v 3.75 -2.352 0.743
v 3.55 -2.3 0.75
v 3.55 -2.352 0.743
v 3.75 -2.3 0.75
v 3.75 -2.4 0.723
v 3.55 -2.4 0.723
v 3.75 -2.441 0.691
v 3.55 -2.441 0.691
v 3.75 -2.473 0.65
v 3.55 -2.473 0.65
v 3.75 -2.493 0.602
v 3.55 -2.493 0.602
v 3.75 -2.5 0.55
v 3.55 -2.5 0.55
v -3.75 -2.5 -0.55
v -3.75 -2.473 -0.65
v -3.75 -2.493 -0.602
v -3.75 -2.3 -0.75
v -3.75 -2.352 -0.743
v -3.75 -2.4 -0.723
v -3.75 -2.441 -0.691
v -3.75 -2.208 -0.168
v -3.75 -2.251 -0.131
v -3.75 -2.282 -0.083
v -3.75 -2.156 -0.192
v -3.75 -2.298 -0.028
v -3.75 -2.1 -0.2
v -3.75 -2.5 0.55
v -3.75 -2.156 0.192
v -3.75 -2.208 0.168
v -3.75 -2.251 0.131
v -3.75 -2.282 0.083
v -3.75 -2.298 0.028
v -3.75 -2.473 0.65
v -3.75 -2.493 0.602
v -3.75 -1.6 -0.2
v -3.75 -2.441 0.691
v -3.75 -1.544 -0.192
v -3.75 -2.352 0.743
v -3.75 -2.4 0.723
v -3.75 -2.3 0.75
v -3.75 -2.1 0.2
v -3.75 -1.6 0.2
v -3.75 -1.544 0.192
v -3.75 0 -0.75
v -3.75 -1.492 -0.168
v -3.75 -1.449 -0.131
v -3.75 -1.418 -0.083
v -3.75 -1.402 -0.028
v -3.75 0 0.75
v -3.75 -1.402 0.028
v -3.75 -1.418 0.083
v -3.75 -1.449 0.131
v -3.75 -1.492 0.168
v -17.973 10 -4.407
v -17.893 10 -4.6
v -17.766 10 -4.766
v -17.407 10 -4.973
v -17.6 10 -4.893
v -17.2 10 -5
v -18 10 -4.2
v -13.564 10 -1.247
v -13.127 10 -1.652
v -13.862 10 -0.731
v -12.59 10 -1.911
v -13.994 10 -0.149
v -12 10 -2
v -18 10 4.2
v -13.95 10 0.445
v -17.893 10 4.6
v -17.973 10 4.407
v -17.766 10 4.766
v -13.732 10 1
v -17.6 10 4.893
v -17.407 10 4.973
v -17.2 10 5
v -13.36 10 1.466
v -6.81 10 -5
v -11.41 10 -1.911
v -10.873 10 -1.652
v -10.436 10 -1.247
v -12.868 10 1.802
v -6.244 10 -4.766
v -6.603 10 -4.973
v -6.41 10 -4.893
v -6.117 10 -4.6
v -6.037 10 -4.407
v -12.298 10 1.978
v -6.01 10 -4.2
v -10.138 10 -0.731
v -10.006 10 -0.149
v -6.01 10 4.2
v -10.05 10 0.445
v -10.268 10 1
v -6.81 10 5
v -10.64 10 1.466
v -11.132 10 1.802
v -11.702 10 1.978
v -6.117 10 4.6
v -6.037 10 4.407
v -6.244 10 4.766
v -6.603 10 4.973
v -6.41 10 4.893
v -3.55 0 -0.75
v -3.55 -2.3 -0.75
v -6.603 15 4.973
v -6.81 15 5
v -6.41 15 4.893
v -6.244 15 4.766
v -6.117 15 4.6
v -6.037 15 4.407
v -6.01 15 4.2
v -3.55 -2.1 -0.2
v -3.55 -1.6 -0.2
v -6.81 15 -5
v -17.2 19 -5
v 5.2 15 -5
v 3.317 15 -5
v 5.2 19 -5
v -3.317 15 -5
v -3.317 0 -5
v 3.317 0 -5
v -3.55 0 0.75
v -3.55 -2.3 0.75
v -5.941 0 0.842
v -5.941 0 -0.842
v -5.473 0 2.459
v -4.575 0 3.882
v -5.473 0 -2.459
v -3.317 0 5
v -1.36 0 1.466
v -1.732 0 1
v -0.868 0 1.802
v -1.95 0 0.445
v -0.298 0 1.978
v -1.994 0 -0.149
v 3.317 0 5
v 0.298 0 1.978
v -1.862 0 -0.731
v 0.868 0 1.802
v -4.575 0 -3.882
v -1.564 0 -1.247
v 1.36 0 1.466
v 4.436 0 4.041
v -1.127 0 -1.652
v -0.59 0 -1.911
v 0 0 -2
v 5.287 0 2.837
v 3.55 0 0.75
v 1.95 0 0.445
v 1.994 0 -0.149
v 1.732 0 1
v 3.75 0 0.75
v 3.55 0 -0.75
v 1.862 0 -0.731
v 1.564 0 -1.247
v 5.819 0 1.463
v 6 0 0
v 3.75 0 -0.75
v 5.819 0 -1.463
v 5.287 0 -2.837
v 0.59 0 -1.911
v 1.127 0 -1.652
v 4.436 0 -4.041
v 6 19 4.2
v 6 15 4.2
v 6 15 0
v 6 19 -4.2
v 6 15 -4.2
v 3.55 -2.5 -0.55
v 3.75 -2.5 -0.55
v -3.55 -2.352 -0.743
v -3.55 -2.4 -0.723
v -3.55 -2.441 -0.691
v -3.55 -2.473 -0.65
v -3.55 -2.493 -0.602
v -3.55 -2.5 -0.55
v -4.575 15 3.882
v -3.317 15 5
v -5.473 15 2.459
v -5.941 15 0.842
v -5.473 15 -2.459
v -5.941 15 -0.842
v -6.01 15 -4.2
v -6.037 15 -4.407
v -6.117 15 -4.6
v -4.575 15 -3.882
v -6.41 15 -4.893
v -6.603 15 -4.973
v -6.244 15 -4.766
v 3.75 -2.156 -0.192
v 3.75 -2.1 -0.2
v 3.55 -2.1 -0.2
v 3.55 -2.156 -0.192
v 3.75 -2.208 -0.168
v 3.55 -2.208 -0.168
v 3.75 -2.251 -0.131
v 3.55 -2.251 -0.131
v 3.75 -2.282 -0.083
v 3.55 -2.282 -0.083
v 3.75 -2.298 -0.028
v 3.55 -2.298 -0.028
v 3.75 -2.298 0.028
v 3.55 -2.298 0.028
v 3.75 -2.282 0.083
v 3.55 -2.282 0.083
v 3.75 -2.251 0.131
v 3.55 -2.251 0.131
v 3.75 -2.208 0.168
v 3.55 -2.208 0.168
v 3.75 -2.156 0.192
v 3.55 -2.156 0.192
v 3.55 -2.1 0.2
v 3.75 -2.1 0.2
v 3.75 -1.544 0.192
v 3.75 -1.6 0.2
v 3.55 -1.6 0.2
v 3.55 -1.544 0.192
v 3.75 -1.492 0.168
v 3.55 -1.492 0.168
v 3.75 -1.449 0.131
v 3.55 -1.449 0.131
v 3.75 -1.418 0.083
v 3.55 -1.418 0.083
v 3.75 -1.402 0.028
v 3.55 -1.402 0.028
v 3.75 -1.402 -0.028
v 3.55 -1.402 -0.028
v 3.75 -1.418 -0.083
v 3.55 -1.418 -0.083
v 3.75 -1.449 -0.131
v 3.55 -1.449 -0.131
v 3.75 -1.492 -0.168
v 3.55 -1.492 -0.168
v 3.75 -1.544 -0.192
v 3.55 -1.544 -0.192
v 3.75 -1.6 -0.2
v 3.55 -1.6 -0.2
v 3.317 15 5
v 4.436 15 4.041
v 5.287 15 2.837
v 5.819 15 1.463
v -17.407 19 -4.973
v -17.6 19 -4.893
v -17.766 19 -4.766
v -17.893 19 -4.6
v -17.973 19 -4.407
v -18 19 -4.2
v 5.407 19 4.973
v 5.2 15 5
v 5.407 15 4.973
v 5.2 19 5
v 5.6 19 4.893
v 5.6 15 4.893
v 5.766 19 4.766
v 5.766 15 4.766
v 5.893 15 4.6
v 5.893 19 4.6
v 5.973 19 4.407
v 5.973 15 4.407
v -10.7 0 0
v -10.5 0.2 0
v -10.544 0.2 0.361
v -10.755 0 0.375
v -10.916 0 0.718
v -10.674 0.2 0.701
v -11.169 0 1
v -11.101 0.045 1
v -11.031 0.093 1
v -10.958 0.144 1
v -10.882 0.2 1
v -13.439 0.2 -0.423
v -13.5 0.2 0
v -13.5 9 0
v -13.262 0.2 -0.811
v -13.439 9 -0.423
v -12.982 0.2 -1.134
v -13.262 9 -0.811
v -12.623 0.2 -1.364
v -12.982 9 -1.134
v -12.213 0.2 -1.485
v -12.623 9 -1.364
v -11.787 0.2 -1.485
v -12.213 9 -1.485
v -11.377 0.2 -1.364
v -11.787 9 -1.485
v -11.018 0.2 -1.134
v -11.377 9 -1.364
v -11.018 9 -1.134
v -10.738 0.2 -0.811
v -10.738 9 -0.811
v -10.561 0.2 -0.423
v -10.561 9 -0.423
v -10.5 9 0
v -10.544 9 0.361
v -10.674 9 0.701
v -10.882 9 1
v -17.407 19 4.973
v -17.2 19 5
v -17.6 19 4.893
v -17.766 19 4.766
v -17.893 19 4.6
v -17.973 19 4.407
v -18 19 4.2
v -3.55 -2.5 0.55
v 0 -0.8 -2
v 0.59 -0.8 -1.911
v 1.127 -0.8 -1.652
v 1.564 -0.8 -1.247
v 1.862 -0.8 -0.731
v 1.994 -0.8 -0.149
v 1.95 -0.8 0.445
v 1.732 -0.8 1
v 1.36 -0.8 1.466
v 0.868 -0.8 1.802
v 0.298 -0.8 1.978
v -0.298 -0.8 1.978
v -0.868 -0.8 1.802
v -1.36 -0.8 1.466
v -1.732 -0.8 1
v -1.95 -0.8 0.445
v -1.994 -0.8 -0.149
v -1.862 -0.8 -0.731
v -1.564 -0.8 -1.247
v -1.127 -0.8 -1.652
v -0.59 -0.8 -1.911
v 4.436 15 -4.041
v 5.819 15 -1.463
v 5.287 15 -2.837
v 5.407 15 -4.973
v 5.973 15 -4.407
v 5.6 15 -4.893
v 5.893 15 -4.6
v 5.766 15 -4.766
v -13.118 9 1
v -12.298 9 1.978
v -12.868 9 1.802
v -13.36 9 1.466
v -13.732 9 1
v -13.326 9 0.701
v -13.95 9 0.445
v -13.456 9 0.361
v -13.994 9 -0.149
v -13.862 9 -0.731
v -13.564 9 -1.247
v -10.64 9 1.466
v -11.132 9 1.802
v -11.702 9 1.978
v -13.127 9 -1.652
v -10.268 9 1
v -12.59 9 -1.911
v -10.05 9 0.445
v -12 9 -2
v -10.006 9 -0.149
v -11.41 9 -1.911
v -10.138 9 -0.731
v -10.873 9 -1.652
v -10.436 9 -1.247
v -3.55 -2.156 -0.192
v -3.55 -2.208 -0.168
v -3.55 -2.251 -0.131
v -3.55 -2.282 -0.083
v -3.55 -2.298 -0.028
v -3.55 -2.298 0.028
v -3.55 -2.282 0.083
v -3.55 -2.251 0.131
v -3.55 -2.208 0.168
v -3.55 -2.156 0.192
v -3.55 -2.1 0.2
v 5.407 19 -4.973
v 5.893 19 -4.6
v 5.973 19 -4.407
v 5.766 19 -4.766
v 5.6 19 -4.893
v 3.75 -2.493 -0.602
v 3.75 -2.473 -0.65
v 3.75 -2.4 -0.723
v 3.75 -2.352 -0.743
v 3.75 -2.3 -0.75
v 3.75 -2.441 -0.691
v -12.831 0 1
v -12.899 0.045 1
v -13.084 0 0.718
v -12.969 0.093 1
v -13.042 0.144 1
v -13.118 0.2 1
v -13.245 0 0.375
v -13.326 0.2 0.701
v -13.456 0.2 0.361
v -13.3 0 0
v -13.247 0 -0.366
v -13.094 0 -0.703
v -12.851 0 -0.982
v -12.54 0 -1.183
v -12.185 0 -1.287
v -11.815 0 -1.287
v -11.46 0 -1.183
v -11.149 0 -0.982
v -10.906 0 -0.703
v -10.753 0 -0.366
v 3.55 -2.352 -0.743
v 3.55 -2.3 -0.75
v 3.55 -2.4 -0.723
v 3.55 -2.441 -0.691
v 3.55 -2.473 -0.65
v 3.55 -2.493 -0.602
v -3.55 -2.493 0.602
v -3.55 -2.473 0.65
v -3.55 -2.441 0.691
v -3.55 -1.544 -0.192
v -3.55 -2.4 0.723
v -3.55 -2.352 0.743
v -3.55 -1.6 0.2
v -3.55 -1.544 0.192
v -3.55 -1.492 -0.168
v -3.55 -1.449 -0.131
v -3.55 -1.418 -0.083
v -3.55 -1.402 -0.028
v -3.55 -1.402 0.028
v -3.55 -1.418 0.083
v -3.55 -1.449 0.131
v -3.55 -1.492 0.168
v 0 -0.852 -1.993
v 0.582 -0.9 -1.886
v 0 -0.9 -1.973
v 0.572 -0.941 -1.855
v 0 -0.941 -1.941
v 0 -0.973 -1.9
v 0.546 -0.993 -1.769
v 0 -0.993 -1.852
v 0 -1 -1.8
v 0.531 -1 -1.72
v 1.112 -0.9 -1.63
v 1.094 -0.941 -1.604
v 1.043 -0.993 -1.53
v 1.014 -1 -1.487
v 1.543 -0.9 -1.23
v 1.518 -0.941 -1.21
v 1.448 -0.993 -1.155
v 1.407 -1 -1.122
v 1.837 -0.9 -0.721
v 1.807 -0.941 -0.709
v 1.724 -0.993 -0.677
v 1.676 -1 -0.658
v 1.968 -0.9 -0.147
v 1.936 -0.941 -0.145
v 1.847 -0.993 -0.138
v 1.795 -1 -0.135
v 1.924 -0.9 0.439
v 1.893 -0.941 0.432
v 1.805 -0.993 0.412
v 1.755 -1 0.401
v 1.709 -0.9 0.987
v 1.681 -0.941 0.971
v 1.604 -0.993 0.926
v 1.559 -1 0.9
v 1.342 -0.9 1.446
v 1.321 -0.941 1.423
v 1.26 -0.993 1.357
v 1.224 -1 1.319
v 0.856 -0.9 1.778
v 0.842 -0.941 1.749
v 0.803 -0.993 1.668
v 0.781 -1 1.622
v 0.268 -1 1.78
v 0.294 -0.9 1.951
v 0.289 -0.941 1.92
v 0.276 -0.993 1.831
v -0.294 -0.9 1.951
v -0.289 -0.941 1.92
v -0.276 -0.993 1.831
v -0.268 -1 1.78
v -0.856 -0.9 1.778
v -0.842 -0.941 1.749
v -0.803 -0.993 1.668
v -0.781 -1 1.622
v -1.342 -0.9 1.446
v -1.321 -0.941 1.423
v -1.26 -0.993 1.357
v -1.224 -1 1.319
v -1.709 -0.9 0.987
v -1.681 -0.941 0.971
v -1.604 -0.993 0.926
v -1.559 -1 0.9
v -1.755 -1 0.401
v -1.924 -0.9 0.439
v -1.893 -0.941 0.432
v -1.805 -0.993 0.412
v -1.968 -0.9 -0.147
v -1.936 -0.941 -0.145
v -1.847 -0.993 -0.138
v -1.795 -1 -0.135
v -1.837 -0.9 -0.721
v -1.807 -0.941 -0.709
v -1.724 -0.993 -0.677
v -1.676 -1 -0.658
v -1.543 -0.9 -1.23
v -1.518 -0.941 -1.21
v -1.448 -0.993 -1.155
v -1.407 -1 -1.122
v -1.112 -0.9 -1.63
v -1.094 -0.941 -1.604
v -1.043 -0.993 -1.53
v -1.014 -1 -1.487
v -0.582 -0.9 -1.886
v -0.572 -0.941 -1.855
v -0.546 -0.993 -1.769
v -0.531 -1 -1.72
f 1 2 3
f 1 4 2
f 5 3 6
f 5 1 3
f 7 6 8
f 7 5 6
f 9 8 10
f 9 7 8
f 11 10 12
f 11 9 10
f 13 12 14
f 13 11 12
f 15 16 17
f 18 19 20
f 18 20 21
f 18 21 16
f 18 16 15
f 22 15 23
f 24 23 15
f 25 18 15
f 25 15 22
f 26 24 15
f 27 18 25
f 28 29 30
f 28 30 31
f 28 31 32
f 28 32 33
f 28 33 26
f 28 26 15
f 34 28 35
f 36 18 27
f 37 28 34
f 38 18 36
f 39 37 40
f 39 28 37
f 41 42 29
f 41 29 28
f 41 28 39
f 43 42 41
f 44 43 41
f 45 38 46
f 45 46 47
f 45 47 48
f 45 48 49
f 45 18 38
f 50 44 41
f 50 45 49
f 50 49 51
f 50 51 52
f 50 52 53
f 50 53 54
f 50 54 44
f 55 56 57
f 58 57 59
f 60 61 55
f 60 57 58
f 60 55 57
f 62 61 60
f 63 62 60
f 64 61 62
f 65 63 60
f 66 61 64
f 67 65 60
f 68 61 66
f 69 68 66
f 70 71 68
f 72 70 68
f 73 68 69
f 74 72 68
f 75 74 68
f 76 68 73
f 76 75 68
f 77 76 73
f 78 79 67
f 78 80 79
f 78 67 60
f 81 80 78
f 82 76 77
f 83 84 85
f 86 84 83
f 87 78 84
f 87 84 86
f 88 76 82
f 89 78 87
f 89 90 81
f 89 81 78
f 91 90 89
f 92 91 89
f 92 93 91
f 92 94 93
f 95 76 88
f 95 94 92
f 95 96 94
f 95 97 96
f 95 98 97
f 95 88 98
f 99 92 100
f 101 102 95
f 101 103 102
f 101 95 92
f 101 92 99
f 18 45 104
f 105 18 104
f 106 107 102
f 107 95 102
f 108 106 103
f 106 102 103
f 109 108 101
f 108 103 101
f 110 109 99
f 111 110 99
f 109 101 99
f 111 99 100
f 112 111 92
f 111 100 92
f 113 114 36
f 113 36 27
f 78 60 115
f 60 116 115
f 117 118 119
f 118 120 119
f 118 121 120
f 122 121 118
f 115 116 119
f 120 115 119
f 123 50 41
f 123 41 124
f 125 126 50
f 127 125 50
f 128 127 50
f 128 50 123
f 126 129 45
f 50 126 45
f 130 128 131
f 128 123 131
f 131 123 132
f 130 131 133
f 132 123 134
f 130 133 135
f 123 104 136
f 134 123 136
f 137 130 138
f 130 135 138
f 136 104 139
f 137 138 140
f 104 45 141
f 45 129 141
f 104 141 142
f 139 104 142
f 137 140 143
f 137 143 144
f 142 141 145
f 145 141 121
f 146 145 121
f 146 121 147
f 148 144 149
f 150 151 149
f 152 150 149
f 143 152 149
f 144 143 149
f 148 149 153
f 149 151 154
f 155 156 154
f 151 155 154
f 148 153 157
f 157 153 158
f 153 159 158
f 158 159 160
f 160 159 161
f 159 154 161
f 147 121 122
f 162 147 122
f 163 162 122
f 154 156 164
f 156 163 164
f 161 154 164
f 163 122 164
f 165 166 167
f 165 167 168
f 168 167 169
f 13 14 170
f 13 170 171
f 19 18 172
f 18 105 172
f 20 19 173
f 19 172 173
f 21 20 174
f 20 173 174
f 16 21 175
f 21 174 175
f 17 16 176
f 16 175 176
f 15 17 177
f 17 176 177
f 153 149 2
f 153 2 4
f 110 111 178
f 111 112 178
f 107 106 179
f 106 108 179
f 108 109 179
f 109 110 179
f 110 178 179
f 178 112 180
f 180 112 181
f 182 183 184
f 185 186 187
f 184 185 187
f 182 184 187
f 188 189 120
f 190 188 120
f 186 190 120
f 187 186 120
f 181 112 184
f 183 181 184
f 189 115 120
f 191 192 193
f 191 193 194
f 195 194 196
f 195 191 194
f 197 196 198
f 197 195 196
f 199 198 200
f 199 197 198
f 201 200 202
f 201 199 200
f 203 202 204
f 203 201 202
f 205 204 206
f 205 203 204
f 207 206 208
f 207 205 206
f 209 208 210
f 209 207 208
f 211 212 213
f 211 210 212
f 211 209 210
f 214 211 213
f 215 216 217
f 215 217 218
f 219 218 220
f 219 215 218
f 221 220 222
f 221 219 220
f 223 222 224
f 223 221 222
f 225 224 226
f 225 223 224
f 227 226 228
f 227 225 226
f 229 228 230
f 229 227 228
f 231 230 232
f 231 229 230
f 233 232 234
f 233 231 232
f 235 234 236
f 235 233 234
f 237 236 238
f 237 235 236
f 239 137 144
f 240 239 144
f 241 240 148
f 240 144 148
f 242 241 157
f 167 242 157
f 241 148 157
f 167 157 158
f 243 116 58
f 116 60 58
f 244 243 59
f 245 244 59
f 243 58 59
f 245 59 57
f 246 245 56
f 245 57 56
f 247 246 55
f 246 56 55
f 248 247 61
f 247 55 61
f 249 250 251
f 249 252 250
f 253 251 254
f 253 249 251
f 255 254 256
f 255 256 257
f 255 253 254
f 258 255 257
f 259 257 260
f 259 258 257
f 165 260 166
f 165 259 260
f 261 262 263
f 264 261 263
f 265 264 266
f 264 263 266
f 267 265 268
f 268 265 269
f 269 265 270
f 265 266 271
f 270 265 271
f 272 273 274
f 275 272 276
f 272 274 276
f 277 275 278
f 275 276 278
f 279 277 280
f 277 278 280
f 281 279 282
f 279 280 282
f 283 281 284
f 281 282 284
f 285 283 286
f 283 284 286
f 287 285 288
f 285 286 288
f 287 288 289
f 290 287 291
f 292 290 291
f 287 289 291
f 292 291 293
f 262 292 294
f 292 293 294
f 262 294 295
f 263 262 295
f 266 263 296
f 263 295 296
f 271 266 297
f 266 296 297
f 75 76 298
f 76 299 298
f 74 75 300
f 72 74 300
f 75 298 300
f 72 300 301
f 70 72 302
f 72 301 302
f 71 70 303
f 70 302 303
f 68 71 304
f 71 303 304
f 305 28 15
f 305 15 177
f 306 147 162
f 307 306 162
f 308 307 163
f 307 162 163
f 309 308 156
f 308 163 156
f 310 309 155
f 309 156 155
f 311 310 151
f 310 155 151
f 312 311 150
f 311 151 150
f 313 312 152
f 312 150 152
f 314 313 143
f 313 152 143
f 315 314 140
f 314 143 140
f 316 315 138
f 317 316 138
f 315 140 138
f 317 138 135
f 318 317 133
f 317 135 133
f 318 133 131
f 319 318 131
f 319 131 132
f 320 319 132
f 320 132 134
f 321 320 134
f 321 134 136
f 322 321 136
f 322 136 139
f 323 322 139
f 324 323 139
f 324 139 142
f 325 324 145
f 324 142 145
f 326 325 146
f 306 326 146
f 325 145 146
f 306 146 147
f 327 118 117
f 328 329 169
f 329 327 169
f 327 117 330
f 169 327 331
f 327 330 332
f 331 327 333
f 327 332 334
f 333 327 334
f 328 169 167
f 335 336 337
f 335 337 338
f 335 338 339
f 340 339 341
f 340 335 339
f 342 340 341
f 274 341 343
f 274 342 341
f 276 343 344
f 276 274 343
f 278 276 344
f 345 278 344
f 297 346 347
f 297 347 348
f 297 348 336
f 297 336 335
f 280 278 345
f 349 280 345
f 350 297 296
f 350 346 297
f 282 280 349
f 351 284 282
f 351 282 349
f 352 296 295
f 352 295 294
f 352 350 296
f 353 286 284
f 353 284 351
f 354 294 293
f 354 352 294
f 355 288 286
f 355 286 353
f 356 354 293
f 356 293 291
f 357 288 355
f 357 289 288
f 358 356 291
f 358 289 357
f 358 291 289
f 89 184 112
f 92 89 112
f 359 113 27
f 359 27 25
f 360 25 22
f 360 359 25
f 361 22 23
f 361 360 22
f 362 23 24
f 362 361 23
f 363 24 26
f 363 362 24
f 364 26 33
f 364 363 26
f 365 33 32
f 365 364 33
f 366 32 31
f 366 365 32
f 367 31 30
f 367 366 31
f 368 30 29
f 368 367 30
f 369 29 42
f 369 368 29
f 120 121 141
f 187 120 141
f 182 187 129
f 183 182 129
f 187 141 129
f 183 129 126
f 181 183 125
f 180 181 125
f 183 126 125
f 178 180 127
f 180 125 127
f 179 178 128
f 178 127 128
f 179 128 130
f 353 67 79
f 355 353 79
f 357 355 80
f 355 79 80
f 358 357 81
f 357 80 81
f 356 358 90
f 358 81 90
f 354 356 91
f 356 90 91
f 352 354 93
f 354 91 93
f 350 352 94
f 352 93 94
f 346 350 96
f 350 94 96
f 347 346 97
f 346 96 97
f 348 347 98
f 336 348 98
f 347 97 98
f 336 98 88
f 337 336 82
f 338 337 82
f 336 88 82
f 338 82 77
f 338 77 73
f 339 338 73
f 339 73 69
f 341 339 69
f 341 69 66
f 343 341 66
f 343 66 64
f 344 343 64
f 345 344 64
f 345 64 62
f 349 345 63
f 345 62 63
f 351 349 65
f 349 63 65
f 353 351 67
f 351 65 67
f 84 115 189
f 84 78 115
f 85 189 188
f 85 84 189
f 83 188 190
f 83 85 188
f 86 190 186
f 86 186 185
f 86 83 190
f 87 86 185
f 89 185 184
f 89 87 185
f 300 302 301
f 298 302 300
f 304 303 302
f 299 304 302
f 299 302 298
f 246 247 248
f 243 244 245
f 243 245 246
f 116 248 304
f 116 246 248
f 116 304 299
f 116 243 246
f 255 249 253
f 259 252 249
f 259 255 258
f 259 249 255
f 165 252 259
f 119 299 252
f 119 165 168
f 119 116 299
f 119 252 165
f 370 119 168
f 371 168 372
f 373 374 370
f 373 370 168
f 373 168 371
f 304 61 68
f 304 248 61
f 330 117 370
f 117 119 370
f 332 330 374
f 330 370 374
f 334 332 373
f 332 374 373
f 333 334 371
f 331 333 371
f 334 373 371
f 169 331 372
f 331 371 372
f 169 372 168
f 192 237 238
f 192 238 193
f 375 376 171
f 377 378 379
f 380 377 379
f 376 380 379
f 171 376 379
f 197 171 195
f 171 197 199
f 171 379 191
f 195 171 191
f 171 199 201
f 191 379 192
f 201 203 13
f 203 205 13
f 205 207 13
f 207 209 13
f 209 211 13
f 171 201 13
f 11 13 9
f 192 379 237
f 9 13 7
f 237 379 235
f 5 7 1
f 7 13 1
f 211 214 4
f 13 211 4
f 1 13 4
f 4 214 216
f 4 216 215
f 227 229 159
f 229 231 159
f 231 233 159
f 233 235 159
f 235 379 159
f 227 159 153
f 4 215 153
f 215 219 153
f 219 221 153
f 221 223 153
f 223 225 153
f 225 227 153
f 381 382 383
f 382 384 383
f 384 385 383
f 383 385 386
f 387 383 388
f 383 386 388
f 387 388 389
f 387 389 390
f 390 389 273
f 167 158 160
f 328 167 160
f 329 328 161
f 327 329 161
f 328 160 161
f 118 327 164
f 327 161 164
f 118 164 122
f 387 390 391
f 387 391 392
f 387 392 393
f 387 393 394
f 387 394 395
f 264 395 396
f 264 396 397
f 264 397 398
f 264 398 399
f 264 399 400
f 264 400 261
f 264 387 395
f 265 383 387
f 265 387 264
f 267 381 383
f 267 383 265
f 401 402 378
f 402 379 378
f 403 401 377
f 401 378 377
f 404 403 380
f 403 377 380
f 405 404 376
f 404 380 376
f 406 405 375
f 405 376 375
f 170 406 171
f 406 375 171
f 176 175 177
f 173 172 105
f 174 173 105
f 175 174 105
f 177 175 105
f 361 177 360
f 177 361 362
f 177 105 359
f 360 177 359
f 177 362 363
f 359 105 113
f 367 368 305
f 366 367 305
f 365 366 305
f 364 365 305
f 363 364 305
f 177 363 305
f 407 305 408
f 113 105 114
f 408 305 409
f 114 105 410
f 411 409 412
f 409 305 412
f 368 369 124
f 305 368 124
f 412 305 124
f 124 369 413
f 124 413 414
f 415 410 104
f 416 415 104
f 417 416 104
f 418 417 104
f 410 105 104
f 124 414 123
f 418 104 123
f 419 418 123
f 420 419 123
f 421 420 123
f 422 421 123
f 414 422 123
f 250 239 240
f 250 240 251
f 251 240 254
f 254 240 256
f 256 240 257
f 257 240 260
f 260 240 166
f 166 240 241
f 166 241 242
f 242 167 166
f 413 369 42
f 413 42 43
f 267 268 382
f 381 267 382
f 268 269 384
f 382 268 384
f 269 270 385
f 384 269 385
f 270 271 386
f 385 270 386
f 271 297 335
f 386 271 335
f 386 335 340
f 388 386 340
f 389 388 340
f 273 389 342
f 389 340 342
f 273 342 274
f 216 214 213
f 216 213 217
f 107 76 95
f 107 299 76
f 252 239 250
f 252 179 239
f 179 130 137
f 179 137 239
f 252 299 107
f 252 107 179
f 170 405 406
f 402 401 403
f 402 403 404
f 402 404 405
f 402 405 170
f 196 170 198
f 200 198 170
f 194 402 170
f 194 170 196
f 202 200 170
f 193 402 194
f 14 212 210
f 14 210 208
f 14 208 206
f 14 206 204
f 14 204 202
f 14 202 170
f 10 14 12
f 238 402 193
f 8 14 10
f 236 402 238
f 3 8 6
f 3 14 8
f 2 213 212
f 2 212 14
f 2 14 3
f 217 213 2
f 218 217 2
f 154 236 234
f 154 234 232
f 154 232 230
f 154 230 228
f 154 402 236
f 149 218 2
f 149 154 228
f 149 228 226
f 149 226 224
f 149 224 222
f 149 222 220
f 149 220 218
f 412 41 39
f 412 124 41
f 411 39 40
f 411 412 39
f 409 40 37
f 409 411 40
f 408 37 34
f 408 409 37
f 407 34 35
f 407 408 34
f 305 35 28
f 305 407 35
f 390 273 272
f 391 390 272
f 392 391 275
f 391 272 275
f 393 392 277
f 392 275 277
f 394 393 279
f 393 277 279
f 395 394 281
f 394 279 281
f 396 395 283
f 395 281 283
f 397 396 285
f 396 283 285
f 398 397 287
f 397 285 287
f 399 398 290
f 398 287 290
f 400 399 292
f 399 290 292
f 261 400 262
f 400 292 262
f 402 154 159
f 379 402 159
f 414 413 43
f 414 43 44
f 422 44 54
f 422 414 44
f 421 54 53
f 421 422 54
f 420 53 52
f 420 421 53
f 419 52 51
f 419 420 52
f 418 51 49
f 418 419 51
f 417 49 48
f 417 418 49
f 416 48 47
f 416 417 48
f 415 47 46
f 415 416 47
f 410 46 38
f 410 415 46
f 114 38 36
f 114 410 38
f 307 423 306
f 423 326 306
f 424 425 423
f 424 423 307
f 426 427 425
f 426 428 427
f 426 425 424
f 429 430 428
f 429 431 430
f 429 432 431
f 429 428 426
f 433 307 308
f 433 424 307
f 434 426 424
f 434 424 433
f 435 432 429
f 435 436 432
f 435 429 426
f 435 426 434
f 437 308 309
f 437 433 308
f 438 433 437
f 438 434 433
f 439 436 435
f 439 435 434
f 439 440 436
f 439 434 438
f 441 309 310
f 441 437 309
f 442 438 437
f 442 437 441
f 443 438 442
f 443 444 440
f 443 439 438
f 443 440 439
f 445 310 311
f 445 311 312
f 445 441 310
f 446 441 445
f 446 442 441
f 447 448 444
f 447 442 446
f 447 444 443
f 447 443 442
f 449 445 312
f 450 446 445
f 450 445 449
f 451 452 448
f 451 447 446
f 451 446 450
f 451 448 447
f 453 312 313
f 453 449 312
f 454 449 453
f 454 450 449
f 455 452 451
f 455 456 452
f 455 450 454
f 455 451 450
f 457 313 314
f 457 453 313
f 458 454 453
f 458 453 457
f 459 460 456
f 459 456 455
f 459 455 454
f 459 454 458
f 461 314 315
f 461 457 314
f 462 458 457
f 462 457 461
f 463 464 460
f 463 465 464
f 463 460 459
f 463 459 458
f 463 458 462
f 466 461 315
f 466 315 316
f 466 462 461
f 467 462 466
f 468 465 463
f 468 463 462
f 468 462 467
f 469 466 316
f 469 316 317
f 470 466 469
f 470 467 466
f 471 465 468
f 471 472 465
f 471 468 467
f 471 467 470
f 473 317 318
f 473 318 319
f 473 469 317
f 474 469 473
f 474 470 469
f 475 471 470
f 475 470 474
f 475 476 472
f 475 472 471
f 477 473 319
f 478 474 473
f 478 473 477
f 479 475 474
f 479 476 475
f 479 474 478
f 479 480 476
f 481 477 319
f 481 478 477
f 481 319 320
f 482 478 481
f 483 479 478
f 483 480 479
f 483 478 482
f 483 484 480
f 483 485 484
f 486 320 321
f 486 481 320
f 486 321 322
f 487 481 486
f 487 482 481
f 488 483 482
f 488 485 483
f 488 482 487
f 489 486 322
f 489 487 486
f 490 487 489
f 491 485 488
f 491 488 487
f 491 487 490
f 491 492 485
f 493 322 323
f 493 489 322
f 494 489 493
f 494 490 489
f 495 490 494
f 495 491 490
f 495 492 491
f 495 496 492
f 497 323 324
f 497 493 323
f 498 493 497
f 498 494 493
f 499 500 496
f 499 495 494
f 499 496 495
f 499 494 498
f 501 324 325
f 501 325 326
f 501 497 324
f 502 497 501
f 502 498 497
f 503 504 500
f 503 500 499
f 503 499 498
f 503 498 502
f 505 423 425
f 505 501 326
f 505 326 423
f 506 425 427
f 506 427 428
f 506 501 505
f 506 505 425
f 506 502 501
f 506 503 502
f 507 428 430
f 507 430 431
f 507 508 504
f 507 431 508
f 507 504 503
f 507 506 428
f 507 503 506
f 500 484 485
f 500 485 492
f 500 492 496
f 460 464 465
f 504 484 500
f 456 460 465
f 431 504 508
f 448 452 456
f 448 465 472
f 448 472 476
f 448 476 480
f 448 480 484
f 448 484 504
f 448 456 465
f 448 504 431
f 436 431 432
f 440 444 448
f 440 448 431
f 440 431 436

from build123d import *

# Parameters (mm, degrees)
EXTRUDE_1_DEPTH     = 15
SKETCH_2_R          = 2
EXTRUDE_2_DEPTH     = 1
SKETCH_4_W          = 24
SKETCH_4_H          = 10
EXTRUDE_3_DEPTH     = 4
SKETCH_5_W          = 11.99
SKETCH_5_H          = 10
EXTRUDE_6_DEPTH     = 5
EXTRUDE_7_DEPTH     = 10
SKETCH_7_R          = 2
EXTRUDE_8_DEPTH     = 1
SKETCH_8_W          = 0.2
SKETCH_8_H          = 1.5
EXTRUDE_9_DEPTH     = 2.5
CUT_EXTRUDE_1_DEPTH = 9.5
FILLET_1_R          = 0.2
FILLET_2_R          = 0.2
FILLET_3_R          = 0.8
CHAMFER_1_SIZE      = 0.2


with BuildPart() as part:
    # 草图1 → 凸台-拉伸1 (new body)
    with BuildSketch(Plane(origin=(0, 0, 0), x_dir=(1, 0, 0), z_dir=(0, 1, 0))):
        with BuildLine():
            Line((3.31662479, 5), (-3.31662479, 5))
            ThreePointArc((-3.31662479, 5), (-6, 0), (-3.31662479, -5))
            Line((-3.31662479, -5), (3.31662479, -5))
            ThreePointArc((3.31662479, -5), (5.286764074, -2.837274331), (6, 0))
            ThreePointArc((6, 0), (5.286764074, 2.837274331), (3.31662479, 5))
        make_face()
    extrude(amount=EXTRUDE_1_DEPTH)

    # 草图2 → 凸台-拉伸2 (add)
    with BuildSketch(Plane.XZ):
        with Locations(Location((0, 0, 0), (0, 0, 270))):
            Circle(SKETCH_2_R)
    extrude(amount=EXTRUDE_2_DEPTH)

    # 草图4 → 凸台-拉伸3 (add)
    with BuildSketch(Plane(origin=(0, 15, 0), x_dir=(1, 0, 0), z_dir=(0, 1, 0))):
        with Locations((-6, 0)):
            Rectangle(SKETCH_4_W, SKETCH_4_H)
    extrude(amount=EXTRUDE_3_DEPTH)

    # 草图5 → 凸台-拉伸6 (add)
    with BuildSketch(Plane.XZ.offset(-15)):
        with Locations((-12.005, 0)):
            Rectangle(SKETCH_5_W, SKETCH_5_H)
    extrude(amount=EXTRUDE_6_DEPTH)

    # 草图6 → 凸台-拉伸7 (add)
    with BuildSketch(Plane.XZ.offset(-10)):
        with BuildLine():
            ThreePointArc((-13.118033989, 1), (-13.401258538, 0.535233135), (-13.5, 0))
            Line((-13.5, 0), (-10.5, 0))
            ThreePointArc((-10.5, 0), (-10.598741462, 0.535233135), (-10.881966011, 1))
            Line((-10.881966011, 1), (-13.118033989, 1))
        make_face()
        with BuildLine():
            Line((-10.5, 0), (-13.5, 0))
            ThreePointArc((-13.5, 0), (-12, -1.5), (-10.5, 0))
        make_face()
    extrude(amount=EXTRUDE_7_DEPTH)

    # 草图7 → 凸台-拉伸8 (add)
    with BuildSketch(Plane.XZ.offset(-10)):
        with Locations(Location((-12, 0, 0), (0, 0, 270))):
            Circle(SKETCH_7_R)
    extrude(amount=EXTRUDE_8_DEPTH)

    # 草图8 → 凸台-拉伸9 (add)
    with BuildSketch(Plane.XZ):
        with Locations((-3.65, 0)):
            Rectangle(SKETCH_8_W, SKETCH_8_H)
        with Locations((3.65, 0)):
            Rectangle(SKETCH_8_W, SKETCH_8_H)
    extrude(amount=EXTRUDE_9_DEPTH)

    # 草图9 → 切除-拉伸1 (cut)
    with BuildSketch(Plane(origin=(3.75, 0, 0), x_dir=(0, 0, -1), z_dir=(1, 0, 0))):
        with BuildLine():
            Line((-0.2, -2.1), (-0.2, -1.6))
            ThreePointArc((-0.2, -1.6), (0, -1.4), (0.2, -1.6))
            Line((0.2, -1.6), (0.2, -2.1))
            ThreePointArc((0.2, -2.1), (0, -2.3), (-0.2, -2.1))
        make_face()
    extrude(amount=-CUT_EXTRUDE_1_DEPTH, mode=Mode.SUBTRACT)

    # 圆角1
    fillet_1_edges = [part.edges().sort_by_distance(p)[0] for p in [
        (-3.65, -2.5, 0.75),
        (-3.65, -2.5, -0.75),
        (3.65, -2.5, 0.75),
        (3.65, -2.5, -0.75),
    ]]
    fillet(fillet_1_edges, radius=FILLET_1_R)

    # 圆角2
    fillet_2_edges = [part.edges().sort_by_distance(p)[0] for p in [
        (0, -1, 2),
    ]]
    fillet(fillet_2_edges, radius=FILLET_2_R)

    # 圆角3
    fillet_3_edges = [part.edges().sort_by_distance(p)[0] for p in [
        (-18, 14.5, 5),
        (6, 17, 5),
        (6, 17, -5),
        (-18, 14.5, -5),
        (-6.01, 12.5, -5),
        (-6.01, 12.5, 5),
    ]]
    fillet(fillet_3_edges, radius=FILLET_3_R)

    # 倒角1
    chamfer_1_edges = [part.edges().sort_by_distance(p)[0] for p in [
        (-12.535233135, 0, -1.401258538),
    ]]
    chamfer(chamfer_1_edges, length=CHAMFER_1_SIZE)


solid = part.part
